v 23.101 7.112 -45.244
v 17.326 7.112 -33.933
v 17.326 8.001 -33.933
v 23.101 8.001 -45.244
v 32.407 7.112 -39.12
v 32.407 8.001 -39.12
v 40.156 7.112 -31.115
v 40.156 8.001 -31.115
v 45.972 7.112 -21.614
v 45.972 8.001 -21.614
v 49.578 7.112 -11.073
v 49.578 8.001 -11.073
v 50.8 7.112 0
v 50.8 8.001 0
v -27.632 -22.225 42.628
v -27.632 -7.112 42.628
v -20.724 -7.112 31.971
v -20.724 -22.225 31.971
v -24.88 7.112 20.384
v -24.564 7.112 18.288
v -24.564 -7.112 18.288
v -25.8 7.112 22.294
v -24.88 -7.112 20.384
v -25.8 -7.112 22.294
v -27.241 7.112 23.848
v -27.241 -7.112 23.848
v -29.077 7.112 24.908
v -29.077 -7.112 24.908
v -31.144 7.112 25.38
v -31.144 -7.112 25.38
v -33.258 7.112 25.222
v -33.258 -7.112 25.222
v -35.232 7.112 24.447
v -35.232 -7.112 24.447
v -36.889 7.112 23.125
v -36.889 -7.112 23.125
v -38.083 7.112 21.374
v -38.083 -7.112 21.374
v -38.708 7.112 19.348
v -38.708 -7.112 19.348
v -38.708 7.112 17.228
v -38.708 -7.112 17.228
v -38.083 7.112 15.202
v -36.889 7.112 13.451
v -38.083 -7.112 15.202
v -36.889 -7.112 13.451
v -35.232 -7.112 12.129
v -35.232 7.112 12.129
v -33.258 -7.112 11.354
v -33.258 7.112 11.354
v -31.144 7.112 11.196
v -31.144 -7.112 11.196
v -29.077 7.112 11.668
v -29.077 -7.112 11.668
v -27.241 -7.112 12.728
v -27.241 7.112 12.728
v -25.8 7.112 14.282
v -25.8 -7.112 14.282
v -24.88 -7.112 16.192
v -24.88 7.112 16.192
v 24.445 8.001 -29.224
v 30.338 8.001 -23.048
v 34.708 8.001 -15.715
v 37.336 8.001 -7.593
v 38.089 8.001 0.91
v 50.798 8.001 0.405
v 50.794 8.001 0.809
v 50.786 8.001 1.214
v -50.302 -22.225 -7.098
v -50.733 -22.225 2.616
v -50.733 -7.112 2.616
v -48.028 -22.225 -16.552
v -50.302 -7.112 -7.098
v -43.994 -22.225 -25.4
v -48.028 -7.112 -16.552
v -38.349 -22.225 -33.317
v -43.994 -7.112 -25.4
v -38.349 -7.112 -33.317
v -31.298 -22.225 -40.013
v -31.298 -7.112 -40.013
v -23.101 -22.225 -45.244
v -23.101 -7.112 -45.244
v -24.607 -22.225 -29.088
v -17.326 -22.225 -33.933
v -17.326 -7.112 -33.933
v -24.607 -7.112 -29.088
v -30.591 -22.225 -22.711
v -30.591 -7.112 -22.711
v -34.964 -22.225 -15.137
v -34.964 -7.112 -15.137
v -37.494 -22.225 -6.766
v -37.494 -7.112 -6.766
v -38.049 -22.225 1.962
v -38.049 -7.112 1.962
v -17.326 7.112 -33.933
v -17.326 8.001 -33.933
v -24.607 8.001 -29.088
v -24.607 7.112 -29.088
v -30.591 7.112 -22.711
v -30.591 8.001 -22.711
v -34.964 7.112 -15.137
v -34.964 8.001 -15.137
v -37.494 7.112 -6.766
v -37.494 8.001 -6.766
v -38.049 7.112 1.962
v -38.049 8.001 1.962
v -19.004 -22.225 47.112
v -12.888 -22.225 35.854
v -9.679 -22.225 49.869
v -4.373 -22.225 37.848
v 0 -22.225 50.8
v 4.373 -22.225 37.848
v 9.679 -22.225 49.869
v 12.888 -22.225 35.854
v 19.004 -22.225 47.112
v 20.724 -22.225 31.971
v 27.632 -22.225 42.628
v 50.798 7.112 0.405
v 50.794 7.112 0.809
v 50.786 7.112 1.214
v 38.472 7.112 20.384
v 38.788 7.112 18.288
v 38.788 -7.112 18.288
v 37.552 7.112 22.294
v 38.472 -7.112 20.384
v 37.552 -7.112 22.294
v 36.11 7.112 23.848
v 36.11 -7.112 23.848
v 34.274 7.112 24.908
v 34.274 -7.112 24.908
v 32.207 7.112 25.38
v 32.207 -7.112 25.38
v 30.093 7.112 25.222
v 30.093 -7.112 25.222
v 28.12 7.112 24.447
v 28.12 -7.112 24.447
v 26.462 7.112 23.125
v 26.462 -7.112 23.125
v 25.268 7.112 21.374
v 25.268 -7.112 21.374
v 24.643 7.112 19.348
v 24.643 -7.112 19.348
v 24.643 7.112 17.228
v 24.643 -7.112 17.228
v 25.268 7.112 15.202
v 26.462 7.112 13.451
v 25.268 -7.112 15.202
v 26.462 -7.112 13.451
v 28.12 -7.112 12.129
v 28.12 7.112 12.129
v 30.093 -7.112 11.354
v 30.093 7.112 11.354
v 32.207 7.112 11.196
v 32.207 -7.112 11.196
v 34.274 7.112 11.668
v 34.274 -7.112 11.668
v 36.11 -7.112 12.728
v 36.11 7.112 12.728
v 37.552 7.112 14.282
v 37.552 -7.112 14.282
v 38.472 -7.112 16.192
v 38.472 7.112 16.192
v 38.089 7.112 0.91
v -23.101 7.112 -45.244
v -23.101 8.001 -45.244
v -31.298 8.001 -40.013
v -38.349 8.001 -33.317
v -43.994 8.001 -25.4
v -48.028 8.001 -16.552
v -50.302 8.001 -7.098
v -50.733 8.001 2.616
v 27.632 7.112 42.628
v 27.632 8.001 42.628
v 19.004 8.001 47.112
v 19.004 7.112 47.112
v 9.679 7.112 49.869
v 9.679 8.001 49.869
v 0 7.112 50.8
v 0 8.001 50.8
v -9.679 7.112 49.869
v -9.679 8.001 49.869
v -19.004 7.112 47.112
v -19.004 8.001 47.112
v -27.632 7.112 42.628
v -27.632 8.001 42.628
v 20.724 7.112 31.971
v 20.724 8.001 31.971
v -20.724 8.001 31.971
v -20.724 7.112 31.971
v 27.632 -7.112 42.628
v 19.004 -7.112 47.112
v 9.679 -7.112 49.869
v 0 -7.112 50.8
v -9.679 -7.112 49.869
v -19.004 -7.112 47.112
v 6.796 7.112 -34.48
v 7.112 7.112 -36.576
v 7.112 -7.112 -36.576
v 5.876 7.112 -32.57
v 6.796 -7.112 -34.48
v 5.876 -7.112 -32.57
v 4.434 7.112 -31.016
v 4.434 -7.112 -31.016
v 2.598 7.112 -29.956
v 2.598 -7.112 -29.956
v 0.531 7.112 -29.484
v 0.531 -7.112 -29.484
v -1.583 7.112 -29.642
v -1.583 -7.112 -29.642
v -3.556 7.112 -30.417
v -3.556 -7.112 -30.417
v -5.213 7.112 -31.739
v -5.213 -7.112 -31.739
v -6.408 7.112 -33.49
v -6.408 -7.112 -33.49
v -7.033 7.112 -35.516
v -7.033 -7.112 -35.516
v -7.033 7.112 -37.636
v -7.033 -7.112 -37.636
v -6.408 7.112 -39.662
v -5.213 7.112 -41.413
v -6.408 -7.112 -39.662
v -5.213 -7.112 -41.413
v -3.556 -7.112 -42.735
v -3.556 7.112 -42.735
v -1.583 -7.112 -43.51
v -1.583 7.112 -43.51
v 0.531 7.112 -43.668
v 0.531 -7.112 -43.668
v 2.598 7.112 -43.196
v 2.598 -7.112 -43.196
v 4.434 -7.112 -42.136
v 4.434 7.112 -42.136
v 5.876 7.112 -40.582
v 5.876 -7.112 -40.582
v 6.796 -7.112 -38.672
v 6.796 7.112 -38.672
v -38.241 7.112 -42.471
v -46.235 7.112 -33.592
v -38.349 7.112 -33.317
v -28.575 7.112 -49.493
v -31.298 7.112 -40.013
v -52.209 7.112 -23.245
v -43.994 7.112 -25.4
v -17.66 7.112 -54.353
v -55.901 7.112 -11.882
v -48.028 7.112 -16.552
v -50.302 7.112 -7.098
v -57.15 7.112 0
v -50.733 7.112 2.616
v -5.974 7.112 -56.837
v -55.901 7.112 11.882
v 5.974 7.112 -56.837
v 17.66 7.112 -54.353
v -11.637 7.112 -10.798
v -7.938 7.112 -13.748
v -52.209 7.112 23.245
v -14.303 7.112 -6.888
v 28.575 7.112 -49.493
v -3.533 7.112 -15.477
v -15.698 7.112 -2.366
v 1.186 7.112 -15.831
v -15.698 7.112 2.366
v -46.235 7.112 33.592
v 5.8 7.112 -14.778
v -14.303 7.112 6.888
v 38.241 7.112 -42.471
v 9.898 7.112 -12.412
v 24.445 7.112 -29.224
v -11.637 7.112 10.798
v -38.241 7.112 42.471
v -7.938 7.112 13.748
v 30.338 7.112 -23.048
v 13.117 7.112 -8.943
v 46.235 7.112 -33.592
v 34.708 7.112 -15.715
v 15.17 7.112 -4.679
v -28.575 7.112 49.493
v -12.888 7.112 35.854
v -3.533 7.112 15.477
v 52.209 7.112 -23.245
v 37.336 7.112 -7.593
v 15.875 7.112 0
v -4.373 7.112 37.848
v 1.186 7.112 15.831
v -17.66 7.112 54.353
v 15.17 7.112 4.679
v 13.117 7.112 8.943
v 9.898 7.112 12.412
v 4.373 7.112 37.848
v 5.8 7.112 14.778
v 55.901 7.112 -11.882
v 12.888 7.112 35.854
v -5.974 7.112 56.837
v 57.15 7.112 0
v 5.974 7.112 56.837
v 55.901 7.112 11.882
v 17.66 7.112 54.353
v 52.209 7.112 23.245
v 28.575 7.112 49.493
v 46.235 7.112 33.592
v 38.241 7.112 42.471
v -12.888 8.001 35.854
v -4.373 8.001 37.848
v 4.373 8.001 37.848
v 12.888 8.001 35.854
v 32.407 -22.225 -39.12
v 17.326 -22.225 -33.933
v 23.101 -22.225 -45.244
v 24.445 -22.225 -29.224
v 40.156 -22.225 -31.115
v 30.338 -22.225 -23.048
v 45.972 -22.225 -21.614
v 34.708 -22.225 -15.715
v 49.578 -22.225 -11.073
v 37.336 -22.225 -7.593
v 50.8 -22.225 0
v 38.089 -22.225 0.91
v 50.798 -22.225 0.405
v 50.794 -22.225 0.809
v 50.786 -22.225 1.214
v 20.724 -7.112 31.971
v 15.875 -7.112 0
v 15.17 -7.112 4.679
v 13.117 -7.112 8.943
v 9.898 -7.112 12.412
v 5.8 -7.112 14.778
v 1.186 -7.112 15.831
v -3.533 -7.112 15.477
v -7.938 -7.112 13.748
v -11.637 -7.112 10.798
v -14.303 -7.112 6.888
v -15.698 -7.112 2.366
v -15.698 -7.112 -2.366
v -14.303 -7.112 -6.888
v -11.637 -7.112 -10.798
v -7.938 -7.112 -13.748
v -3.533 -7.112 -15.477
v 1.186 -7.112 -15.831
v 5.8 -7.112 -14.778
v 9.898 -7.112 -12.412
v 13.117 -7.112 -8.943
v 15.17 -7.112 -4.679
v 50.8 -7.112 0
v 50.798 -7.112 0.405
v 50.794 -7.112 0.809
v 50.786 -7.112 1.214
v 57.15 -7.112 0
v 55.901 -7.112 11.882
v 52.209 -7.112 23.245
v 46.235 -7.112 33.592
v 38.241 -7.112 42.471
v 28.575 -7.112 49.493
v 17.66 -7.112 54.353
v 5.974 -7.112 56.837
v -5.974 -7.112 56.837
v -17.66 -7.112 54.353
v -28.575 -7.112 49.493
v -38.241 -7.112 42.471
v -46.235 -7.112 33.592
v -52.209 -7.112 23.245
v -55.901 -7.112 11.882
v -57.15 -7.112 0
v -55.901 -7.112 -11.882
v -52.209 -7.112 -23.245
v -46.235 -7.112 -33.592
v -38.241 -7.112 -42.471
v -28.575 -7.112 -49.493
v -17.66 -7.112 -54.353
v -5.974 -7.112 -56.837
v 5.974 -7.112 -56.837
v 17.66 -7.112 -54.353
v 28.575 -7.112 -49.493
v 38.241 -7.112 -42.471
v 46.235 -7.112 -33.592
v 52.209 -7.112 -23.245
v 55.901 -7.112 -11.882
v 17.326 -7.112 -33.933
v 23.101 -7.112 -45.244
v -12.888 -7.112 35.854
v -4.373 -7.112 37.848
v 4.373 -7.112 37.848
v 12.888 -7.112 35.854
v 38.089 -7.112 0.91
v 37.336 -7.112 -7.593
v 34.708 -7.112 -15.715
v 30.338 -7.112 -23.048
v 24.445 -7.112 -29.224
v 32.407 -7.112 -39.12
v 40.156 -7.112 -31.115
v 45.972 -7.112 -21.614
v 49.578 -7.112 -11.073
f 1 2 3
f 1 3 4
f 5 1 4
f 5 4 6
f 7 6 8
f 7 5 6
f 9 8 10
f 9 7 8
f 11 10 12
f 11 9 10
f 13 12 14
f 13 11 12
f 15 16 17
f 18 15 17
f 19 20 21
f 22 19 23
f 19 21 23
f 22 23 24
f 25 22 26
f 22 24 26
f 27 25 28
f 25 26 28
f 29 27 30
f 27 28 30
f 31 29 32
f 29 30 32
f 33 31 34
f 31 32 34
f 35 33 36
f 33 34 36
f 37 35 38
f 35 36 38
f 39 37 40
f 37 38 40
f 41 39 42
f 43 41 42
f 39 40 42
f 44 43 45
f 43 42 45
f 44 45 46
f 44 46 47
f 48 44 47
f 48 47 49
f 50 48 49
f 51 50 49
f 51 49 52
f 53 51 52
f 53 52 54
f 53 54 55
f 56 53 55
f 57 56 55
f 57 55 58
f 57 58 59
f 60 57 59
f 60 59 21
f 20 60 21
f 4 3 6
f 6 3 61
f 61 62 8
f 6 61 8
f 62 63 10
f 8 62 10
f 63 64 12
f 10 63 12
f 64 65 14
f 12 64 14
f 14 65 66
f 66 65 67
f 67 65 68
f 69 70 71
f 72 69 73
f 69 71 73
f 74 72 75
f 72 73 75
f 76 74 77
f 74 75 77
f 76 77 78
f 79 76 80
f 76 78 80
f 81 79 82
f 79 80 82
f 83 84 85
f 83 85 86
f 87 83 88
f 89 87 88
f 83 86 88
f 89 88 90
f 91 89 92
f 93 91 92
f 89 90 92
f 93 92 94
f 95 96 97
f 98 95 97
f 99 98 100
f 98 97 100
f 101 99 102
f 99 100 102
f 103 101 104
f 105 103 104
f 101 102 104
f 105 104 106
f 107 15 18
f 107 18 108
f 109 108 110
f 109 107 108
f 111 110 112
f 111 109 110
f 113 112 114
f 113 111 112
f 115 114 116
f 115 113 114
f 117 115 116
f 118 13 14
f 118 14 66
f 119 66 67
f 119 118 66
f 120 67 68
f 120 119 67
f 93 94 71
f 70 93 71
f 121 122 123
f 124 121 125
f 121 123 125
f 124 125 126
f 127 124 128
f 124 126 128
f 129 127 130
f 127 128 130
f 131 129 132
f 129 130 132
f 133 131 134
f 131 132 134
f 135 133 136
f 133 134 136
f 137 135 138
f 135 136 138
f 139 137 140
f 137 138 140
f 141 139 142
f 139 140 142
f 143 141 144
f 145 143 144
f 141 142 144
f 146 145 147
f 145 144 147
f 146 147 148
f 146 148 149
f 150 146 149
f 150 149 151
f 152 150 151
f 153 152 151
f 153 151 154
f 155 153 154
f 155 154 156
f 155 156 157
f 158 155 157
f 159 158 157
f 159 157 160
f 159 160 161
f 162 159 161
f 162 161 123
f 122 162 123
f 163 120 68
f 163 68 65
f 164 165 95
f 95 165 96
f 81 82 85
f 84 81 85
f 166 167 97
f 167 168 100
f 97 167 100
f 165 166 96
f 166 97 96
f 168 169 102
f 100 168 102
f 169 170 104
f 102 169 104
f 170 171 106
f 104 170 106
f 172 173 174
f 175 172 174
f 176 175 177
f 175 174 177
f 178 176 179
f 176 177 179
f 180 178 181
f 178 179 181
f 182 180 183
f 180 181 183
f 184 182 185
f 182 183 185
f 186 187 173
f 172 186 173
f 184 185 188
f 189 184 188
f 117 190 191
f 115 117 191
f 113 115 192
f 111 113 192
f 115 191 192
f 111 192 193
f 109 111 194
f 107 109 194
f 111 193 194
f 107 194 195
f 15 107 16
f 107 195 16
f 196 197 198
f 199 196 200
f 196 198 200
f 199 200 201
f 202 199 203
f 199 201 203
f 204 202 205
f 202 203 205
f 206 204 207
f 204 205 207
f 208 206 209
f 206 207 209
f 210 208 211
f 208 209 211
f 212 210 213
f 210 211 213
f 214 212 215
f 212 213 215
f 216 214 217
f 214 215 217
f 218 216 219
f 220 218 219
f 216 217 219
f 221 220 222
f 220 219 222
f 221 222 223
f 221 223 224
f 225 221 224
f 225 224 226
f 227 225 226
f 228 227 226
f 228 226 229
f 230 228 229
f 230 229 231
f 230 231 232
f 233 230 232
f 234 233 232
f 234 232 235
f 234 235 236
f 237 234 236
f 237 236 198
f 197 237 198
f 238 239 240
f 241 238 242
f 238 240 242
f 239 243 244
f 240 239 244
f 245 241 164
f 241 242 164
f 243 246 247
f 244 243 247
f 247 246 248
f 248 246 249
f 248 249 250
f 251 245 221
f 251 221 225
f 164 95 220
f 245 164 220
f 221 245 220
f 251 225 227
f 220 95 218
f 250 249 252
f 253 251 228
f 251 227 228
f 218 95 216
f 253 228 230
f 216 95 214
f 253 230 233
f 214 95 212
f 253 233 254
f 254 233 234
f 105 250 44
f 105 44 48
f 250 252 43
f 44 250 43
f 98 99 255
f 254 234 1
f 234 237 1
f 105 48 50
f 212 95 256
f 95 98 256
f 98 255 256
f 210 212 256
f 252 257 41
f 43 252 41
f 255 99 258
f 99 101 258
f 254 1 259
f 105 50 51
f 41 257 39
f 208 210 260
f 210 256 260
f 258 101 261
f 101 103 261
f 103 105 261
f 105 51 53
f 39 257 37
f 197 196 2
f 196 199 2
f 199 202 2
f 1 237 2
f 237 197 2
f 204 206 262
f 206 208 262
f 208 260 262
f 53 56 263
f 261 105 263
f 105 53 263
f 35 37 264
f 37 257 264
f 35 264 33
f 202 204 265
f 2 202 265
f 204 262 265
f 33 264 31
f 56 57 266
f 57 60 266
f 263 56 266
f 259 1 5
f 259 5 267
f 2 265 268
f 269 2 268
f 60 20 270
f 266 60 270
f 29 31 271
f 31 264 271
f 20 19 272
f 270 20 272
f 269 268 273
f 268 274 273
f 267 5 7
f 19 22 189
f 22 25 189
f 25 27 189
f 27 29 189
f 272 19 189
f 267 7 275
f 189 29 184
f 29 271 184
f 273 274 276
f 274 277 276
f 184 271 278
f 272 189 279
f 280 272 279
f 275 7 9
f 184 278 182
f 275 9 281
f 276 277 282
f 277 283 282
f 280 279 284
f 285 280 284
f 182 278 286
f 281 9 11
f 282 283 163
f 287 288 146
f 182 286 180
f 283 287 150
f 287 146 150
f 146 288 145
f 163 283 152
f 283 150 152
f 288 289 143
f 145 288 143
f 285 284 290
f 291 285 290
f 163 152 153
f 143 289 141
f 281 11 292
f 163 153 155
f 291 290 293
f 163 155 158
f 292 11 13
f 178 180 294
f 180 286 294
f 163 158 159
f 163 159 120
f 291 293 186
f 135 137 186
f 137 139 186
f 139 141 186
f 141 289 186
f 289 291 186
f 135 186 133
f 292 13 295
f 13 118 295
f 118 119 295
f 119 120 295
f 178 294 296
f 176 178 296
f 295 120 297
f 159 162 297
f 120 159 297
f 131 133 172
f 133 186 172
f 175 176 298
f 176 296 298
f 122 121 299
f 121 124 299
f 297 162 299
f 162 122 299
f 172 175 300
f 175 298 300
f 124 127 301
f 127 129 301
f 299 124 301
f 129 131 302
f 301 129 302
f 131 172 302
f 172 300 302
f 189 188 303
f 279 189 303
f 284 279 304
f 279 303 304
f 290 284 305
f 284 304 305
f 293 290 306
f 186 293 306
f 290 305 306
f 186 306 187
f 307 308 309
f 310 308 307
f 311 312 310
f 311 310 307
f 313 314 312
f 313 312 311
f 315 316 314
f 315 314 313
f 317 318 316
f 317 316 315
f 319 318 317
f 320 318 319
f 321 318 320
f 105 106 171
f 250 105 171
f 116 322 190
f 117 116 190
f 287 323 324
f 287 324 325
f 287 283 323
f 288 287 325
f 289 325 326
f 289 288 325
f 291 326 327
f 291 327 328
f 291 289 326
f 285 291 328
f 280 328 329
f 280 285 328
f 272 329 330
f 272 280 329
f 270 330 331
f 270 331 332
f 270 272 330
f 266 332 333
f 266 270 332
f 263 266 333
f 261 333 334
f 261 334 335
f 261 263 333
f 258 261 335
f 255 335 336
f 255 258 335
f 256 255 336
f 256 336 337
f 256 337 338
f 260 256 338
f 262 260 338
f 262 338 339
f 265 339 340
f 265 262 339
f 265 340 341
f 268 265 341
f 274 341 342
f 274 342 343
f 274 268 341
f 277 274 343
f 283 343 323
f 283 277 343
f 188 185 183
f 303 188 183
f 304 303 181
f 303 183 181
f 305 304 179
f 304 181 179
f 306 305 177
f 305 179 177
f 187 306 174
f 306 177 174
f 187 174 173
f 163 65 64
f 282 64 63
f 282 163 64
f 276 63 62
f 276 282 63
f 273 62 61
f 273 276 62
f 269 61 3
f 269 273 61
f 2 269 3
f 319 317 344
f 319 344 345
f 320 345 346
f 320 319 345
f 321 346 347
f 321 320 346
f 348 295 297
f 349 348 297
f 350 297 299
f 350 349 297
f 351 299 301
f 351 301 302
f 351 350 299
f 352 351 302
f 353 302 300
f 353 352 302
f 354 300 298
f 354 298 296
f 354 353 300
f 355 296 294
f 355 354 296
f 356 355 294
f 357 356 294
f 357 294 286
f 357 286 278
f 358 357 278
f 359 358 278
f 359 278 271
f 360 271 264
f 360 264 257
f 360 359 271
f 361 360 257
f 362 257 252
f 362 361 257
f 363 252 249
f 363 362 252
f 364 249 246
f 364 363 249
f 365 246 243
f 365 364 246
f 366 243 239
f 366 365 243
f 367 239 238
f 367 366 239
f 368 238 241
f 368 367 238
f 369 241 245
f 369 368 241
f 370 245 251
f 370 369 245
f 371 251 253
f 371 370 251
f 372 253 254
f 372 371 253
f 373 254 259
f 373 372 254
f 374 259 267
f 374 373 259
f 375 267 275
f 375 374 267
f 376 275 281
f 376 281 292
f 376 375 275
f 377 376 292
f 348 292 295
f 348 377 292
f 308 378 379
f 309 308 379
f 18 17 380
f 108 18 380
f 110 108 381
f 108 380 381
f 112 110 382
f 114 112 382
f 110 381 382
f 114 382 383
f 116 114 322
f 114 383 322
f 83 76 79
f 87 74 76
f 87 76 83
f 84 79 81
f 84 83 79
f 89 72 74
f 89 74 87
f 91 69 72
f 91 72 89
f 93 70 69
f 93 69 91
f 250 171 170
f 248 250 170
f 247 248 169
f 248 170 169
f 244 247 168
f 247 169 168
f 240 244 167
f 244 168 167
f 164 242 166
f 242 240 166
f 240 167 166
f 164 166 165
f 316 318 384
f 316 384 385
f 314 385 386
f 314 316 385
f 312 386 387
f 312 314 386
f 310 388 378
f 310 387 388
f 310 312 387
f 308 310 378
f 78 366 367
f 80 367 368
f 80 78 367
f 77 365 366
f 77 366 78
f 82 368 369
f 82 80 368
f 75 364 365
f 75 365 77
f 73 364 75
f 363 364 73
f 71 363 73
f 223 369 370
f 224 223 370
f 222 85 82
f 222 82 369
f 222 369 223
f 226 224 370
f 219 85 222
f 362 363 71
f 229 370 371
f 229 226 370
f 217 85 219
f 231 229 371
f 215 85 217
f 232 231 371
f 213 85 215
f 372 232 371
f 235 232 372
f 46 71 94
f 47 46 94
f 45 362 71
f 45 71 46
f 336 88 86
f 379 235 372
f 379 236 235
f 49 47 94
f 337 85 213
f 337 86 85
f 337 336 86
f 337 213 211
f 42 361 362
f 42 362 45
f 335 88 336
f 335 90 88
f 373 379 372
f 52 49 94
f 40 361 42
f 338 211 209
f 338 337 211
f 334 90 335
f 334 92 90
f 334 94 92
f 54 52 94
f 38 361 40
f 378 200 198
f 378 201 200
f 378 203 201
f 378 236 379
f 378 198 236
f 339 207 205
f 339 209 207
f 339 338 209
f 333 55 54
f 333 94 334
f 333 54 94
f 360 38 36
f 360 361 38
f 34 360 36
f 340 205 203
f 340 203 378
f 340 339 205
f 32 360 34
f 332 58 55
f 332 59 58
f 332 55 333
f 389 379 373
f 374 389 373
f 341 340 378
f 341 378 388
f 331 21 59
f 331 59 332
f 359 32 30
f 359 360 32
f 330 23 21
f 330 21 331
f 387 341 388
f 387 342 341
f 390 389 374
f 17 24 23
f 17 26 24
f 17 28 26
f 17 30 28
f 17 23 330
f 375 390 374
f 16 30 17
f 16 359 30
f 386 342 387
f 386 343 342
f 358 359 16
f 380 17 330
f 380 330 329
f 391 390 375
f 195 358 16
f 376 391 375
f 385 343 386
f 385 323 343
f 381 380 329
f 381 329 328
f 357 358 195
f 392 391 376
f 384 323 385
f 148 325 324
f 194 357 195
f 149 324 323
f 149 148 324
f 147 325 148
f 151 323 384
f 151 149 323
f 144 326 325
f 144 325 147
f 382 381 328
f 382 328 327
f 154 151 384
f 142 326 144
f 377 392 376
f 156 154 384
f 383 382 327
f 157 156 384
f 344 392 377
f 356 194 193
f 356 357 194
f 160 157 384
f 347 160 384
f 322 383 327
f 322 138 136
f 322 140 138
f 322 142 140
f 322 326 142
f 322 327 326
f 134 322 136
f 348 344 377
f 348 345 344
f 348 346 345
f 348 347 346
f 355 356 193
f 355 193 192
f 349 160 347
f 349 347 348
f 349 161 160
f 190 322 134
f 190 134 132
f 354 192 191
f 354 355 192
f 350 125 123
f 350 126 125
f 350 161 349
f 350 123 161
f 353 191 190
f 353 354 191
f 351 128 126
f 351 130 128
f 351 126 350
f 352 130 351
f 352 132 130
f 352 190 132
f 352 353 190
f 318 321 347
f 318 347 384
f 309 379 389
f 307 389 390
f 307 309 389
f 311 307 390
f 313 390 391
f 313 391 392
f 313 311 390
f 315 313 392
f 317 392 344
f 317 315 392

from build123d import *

# Parameters (mm, degrees)
F0_R     = 57.15
F0_R_2   = 15.875
F1_DEPTH = 7.112
F3_DEPTH = 15.113
F2_R     = 7.112
F4_DEPTH = 15.114


with BuildPart() as f1:
    # F0 (on Front) → F1 (new body, symmetric)
    with BuildSketch(Plane.XZ):
        Circle(F0_R)
        Circle(F0_R_2, mode=Mode.SUBTRACT)
    extrude(amount=F1_DEPTH, both=True)

    # F2 (on face) → F3 (join, symmetric)
    with BuildSketch(Plane.XZ.offset(7.112)):
        with BuildLine():
            ThreePointArc((-17.325537, -33.932813), (-32.995568, -19.05), (-38.049446, 1.962051))
            Line((-38.049446, 1.962051), (-50.732595, 2.616068))
            ThreePointArc((-50.732595, 2.616068), (-43.994091, -25.4), (-23.100716, -45.24375))
            Line((-23.100716, -45.24375), (-17.325537, -33.932813))
        make_face()
        with BuildLine():
            ThreePointArc((27.631879, 42.627682), (0, 50.8), (-27.631879, 42.627682))
            Line((-27.631879, 42.627682), (-20.723909, 31.970762))
            ThreePointArc((-20.723909, 31.970762), (0, 38.1), (20.723909, 31.970762))
            Line((20.723909, 31.970762), (27.631879, 42.627682))
        make_face()
        with BuildLine():
            Line((17.325537, -33.932813), (23.100716, -45.24375))
            ThreePointArc((23.100716, -45.24375), (43.32526, -26.52474), (50.8, 0))
            ThreePointArc((50.8, 0), (50.796375, 0.606886), (50.7855, 1.213686))
            Line((50.7855, 1.213686), (38.089125, 0.910265))
            ThreePointArc((38.089125, 0.910265), (32.729286, -19.503943), (17.325537, -33.932813))
        make_face()
    extrude(amount=F3_DEPTH, both=True)

    # F2 (on face) → F4 (cut, through all)
    with BuildSketch(Plane.XZ.offset(7.112)):
        with Locations((-31.675745, 18.288)):
            Circle(F2_R)
        with Locations((31.675745, 18.288)):
            Circle(F2_R)
        with Locations((0, -36.576)):
            Circle(F2_R)
    extrude(amount=-F4_DEPTH, mode=Mode.SUBTRACT)


solid = f1.part
